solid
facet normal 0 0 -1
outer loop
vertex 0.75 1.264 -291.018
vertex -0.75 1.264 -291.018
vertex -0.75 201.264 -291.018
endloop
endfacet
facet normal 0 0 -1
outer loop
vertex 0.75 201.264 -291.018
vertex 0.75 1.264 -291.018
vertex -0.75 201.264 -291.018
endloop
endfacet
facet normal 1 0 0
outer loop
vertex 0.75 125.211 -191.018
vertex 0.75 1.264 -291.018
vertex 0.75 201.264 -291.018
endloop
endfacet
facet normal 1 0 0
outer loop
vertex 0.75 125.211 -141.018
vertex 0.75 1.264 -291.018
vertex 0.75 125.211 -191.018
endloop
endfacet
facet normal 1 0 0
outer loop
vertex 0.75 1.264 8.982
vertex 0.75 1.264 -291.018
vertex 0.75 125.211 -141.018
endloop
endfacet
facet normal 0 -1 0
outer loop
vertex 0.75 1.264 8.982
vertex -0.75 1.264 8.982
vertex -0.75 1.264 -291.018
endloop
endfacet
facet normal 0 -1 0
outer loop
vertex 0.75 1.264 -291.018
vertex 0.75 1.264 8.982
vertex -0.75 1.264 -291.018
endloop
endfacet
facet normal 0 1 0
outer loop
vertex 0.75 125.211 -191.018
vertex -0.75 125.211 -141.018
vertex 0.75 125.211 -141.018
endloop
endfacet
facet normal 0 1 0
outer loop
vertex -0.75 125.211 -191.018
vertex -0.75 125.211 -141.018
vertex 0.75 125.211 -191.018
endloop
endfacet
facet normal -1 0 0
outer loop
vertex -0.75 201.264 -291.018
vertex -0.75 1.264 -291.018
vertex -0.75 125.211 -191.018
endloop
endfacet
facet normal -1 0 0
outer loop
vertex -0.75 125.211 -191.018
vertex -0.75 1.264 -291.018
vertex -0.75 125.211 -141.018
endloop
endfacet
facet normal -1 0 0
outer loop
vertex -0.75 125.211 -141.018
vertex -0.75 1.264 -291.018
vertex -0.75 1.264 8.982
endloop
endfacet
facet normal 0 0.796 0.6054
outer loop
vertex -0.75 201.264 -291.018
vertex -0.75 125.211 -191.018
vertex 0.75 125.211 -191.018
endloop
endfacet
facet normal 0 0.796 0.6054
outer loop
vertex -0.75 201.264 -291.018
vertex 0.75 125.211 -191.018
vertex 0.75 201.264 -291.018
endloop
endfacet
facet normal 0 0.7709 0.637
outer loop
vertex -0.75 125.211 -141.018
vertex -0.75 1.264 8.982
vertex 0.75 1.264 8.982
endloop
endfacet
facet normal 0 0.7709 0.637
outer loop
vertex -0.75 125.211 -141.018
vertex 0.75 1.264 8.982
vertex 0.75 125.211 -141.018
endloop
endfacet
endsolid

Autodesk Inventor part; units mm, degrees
ref_plane "YZ Plane" through (0, 0, 0) normal (1, 0, 0) x (0, 1, 0)
ref_plane "XZ Plane" through (0, 0, 0) normal (0, 1, 0) x (-1, 0, 0)
ref_plane "XY Plane" through (0, 0, 0) normal (0, 0, 1) x (1, 0, 0)
sketch "Boceto1" plane through (0, 0, 0) normal (1, 0, 0) x (0, 1, 0)
  line L0 (1.2642, 8.9824) -> (1.2642, -291.0176)
  line L1 (1.2642, -291.0176) -> (201.2642, -291.0176)
  line L2 (1.2642, 8.9824) -> (125.2111, -141.0176)
  line L3 (125.2111, -141.0176) -> (125.2111, -191.0176)
  line L4 (125.2111, -191.0176) -> (201.2642, -291.0176)
  point P0 (0, 0)
  dimension "d0" = 300
  dimension "d1" = 200
  dimension "d4" = 50
extrude "Extrusión1" add sketch "Boceto1" along normal mid plane 1.5
properties part number "parte lateral"
